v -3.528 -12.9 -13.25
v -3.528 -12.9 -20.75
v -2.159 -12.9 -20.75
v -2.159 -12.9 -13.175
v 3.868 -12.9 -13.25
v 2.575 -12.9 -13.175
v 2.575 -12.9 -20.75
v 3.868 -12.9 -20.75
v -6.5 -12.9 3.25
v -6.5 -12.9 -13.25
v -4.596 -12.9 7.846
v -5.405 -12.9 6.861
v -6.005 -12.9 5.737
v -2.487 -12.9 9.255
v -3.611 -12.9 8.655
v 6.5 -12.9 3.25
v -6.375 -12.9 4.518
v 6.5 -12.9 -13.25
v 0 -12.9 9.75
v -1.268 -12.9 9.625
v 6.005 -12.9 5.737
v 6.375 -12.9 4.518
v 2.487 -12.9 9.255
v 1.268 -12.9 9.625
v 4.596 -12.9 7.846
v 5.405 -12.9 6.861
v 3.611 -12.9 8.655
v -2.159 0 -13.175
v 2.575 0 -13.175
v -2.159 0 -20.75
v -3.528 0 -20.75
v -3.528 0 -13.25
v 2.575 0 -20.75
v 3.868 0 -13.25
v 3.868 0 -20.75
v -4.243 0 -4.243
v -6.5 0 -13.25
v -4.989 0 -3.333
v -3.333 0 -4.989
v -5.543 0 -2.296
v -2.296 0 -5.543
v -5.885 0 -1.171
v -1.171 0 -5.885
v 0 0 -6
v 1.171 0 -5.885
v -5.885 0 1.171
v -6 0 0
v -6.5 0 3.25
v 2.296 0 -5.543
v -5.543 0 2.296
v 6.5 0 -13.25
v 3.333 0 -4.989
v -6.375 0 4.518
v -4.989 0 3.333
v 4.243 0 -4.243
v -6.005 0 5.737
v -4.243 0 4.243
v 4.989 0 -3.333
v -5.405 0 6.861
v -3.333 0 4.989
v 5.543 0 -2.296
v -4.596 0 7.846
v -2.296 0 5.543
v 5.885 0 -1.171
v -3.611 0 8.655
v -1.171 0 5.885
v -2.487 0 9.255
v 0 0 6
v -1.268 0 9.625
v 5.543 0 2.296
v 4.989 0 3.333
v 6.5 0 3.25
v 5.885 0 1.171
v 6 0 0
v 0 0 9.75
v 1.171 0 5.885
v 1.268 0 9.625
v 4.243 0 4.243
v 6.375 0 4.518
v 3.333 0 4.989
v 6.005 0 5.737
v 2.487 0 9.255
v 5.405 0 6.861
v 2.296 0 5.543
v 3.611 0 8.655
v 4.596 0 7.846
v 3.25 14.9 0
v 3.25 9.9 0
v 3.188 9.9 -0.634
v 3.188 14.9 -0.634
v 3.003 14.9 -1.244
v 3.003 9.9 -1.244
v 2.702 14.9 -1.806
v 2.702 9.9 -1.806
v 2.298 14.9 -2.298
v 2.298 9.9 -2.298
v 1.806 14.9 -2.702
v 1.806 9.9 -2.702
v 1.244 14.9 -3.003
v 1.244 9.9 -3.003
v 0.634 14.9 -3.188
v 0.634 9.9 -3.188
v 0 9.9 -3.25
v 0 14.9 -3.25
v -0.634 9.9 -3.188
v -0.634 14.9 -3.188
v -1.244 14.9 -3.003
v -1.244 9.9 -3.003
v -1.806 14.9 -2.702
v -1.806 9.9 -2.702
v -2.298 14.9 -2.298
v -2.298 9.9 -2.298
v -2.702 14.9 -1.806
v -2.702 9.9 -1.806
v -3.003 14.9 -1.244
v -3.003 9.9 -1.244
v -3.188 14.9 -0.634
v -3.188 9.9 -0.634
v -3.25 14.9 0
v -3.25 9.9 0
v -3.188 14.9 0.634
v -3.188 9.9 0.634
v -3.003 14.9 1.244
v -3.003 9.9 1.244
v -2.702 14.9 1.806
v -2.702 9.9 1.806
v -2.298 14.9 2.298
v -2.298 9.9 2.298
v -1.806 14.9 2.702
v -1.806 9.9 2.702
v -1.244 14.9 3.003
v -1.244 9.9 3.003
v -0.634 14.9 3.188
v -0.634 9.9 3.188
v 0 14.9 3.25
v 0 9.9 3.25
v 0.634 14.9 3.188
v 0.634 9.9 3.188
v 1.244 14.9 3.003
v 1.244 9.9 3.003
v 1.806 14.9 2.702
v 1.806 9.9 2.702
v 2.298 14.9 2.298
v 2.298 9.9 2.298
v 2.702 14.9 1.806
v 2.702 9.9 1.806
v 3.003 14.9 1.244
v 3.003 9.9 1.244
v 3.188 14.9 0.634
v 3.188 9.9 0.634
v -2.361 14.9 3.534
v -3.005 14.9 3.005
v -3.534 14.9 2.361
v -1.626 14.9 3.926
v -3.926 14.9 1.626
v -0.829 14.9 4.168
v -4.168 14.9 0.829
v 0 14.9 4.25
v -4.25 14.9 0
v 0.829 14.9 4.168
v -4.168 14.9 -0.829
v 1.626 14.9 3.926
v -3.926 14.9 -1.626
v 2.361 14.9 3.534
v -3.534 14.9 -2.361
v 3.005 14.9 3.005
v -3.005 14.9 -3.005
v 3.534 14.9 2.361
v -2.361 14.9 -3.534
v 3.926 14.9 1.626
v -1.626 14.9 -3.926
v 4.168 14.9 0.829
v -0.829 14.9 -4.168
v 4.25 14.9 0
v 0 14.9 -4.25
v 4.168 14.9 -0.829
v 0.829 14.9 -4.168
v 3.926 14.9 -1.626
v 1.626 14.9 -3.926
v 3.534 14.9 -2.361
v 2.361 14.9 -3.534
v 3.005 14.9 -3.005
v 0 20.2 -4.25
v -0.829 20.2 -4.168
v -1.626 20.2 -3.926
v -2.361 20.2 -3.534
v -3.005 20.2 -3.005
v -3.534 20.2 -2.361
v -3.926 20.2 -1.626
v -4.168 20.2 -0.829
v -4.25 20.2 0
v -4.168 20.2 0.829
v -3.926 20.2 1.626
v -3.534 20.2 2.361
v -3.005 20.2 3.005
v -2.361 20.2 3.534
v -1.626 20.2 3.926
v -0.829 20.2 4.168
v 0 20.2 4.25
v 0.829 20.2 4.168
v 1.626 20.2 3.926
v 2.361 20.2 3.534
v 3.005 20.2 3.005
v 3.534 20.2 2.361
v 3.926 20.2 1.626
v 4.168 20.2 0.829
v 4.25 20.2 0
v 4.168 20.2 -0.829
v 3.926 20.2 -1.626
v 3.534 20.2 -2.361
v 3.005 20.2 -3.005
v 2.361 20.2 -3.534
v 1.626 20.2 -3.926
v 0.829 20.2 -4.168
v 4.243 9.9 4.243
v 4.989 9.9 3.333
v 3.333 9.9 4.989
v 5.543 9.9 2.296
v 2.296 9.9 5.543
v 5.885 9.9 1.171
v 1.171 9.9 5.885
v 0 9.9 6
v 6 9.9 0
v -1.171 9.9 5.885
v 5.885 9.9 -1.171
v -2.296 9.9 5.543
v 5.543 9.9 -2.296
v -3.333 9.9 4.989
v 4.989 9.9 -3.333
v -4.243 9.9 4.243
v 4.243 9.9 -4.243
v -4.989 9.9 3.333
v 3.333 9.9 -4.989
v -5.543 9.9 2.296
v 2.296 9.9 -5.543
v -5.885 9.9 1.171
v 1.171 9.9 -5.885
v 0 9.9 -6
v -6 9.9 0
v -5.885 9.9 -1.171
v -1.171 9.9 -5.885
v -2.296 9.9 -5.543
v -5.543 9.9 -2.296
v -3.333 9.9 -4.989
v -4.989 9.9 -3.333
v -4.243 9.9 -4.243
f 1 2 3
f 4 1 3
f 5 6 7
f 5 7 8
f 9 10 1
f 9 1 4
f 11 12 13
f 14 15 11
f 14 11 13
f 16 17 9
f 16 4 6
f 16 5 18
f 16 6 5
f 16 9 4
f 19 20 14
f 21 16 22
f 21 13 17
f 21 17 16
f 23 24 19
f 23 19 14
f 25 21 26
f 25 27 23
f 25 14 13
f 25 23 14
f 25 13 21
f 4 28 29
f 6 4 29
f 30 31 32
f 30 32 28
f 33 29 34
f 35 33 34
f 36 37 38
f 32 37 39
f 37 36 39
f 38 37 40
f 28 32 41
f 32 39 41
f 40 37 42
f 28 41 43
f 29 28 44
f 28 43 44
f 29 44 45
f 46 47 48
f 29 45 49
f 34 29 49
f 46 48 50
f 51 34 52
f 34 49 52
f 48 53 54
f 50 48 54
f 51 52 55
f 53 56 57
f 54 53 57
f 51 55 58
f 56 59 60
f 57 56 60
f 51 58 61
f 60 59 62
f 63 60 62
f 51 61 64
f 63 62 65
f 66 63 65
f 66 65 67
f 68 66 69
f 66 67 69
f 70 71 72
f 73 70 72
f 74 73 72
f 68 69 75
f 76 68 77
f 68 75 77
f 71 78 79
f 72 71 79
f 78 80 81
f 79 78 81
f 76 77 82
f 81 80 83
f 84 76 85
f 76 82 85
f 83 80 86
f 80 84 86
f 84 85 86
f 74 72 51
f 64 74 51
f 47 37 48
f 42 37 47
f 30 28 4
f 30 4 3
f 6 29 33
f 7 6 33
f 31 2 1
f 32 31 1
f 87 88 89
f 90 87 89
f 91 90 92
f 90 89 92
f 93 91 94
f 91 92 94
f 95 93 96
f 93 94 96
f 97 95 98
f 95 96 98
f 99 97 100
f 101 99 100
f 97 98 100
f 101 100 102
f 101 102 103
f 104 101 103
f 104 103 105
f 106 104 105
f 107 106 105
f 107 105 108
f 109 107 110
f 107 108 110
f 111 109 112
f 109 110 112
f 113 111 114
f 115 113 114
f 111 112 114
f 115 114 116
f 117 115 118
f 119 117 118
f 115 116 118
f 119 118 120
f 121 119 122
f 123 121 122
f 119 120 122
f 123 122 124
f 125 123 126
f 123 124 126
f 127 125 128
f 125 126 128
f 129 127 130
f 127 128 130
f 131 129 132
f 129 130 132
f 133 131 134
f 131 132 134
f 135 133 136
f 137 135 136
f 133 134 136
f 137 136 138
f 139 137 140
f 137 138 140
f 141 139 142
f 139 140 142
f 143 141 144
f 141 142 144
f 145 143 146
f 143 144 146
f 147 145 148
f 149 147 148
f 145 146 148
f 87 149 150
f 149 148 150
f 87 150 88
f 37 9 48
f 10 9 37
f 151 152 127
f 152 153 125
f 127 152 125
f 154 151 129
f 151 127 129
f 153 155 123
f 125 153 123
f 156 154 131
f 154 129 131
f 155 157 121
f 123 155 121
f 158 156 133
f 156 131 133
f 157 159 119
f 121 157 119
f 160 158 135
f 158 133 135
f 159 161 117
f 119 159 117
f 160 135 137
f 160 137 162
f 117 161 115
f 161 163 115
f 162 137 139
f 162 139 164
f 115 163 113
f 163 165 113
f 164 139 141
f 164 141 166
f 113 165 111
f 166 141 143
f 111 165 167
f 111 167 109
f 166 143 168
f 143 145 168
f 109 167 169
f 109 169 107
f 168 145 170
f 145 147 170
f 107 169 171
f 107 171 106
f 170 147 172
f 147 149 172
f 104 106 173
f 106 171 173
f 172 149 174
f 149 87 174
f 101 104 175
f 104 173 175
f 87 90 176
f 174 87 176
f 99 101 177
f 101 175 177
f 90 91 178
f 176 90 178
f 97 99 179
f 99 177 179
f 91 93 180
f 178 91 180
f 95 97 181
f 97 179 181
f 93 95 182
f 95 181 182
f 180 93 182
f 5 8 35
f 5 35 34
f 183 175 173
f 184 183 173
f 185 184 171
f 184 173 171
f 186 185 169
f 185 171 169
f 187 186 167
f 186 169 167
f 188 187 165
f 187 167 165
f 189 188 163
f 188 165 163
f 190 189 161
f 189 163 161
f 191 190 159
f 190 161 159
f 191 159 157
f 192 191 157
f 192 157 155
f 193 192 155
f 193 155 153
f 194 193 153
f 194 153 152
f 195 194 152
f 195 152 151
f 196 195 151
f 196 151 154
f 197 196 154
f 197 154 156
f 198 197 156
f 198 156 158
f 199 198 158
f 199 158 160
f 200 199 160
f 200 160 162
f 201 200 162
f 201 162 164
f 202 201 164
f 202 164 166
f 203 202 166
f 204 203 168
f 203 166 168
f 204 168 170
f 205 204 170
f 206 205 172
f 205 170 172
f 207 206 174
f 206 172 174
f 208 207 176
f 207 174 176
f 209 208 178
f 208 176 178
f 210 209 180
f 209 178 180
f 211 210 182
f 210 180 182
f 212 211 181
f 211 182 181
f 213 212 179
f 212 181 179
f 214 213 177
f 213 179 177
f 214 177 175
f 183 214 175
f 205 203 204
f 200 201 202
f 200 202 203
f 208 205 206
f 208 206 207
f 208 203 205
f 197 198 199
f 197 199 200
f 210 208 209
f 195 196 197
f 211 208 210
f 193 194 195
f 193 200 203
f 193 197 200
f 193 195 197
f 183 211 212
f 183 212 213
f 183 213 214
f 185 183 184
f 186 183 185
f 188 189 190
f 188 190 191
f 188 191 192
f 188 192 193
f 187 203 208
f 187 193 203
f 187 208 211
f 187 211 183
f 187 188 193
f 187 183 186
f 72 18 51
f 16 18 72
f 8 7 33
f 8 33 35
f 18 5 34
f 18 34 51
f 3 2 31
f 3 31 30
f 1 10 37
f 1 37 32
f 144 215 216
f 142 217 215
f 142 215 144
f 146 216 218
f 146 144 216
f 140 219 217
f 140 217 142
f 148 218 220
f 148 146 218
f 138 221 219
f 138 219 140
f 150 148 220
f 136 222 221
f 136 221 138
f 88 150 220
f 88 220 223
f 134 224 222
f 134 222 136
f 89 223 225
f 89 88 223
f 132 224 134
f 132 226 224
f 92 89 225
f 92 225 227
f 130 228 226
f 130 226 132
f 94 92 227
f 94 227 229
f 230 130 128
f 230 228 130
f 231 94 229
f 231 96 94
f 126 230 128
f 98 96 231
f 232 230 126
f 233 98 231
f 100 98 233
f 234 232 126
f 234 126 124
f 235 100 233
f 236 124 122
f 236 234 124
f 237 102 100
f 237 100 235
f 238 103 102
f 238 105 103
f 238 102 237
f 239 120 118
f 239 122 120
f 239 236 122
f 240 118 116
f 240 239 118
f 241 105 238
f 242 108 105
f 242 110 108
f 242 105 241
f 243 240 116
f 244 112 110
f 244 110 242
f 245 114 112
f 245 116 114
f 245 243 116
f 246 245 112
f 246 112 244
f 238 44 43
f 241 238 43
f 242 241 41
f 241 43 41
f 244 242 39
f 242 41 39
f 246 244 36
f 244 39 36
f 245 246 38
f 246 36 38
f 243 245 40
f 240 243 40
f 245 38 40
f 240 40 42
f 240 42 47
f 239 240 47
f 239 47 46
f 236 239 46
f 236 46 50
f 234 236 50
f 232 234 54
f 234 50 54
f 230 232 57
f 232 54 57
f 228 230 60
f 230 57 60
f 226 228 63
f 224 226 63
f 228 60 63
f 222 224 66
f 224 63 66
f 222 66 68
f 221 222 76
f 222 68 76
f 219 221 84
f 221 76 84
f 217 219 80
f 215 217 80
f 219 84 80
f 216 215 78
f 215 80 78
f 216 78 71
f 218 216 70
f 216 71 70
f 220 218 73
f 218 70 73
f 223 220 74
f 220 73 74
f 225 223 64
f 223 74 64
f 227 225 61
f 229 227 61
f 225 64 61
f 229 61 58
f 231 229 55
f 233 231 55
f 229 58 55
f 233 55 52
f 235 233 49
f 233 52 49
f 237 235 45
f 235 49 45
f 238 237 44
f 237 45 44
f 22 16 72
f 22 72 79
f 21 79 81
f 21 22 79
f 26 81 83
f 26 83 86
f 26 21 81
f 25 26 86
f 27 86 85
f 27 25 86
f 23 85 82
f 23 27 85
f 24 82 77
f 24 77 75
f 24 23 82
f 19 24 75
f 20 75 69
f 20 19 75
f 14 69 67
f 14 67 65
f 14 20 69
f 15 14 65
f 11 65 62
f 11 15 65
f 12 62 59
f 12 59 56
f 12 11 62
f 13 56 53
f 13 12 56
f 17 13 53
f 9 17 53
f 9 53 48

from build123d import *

# Parameters (mm, degrees)
SKETCH_1_R            = 6
EXTRUDE_1_DEPTH       = 9.9
SKETCH_2_R            = 4.25
EXTRUDE_2_DEPTH       = 10.3
SKETCH_2_2_R          = 4.25
SKETCH_2_2_R_2        = 3.25
CUT_EXTRUDE_1_DEPTH   = 5
EXTRUDE_3_DEPTH       = 12.9
SKETCH_4_W            = 4.733909146
SKETCH_4_H            = 7.574967903
CUT_EXTRUDE_1_2_DEPTH = 12.9


with BuildPart() as part:
    # 草图1 → 凸台-拉伸1 (new body)
    with BuildSketch(Plane(origin=(0, 0, 0), x_dir=(1, 0, 0), z_dir=(0, 1, 0))):
        Circle(SKETCH_1_R)
    extrude(amount=EXTRUDE_1_DEPTH)

    # 草图2 → 凸台-拉伸2 (add)
    with BuildSketch(Plane(origin=(0, 9.9, 0), x_dir=(1, 0, 0), z_dir=(0, 1, 0))):
        Circle(SKETCH_2_R)
    extrude(amount=EXTRUDE_2_DEPTH)

    # 草图2<2> → Cut-Extrude 1 (cut)
    with BuildSketch(Plane(origin=(0, 9.9, 0), x_dir=(1, 0, 0), z_dir=(0, 1, 0))):
        Circle(SKETCH_2_2_R)
        Circle(SKETCH_2_2_R_2, mode=Mode.SUBTRACT)
    extrude(amount=CUT_EXTRUDE_1_DEPTH, mode=Mode.SUBTRACT)

    # 草图3 → 凸台-拉伸3 (add)
    with BuildSketch(Plane.XZ):
        with BuildLine():
            Line((6.5, -13.25), (6.5, 3.25))
            ThreePointArc((6.5, 3.25), (0, 9.75), (-6.5, 3.25))
            Line((-6.5, 3.25), (-6.5, -13.25))
            Line((-6.5, -13.25), (-3.527984912, -13.25))
            Line((-3.527984912, -13.25), (-3.527984912, -20.75))
            Line((-3.527984912, -20.75), (3.868172302, -20.75))
            Line((3.868172302, -20.75), (3.868172302, -13.25))
            Line((3.868172302, -13.25), (6.5, -13.25))
        make_face()
    extrude(amount=EXTRUDE_3_DEPTH)

    # 草图4 → Cut-Extrude 1 2 (cut)
    with BuildSketch(Plane(origin=(0, 0, 0), x_dir=(1, 0, 0), z_dir=(0, 1, 0))):
        with Locations((0.208089462, 16.962516048)):
            Rectangle(SKETCH_4_W, SKETCH_4_H)
    extrude(amount=-CUT_EXTRUDE_1_2_DEPTH, mode=Mode.SUBTRACT)


solid = part.part
